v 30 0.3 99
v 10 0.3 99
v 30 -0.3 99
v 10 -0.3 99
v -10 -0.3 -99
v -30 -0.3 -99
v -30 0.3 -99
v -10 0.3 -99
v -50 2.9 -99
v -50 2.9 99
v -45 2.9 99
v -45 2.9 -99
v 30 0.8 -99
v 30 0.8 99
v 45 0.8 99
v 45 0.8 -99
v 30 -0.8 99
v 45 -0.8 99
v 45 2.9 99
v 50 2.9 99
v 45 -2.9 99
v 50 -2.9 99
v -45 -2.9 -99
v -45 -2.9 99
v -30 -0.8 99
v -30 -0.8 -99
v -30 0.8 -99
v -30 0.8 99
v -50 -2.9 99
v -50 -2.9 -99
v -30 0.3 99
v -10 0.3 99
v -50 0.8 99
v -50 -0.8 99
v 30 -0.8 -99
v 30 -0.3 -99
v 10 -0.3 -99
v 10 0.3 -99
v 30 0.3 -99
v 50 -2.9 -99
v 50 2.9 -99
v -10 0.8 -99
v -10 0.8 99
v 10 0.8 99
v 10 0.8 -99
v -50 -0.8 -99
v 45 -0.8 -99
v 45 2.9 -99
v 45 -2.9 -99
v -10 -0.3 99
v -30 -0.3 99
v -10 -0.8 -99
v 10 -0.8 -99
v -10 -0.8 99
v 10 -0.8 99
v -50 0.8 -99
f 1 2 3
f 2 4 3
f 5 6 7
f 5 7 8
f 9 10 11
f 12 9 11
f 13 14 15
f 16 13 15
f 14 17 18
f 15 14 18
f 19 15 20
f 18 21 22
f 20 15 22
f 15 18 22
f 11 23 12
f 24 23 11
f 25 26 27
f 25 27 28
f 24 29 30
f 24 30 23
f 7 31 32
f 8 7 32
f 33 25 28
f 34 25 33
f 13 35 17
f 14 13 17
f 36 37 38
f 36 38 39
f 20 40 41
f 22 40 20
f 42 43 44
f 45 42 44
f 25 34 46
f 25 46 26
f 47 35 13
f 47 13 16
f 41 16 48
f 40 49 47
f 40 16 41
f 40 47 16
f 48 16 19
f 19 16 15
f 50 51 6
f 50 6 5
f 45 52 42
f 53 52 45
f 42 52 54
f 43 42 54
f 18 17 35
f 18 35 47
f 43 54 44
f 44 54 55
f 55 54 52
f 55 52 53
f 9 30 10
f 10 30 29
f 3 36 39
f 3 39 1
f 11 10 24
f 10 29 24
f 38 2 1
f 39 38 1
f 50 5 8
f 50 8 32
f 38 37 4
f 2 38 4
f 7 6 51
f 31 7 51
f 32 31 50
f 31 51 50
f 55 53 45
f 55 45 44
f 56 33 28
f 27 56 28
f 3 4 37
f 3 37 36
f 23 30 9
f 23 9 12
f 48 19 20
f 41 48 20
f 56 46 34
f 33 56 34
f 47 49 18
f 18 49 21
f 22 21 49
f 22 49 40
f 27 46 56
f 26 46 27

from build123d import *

# Parameters (mm, degrees)
F0_W     = 5
F0_H     = 198
F1_DEPTH = 2.9
F0_W_2   = 15
F2_DEPTH = 0.8
F0_W_3   = 20
F3_DEPTH = 0.3


with BuildPart() as f1:
    # F0 (on Front) → F1 (new body, symmetric)
    with BuildSketch(Plane.XZ):
        with Locations((47.5, 0)):
            Rectangle(F0_W, F0_H)
    extrude(amount=F1_DEPTH, both=True)

    # F0 (on Front) → F2 (join, symmetric)
    with BuildSketch(Plane.XZ):
        with Locations((37.5, 0)):
            Rectangle(F0_W_2, F0_H)
    extrude(amount=F2_DEPTH, both=True)


with BuildPart() as f1b:
    # F0 (on Front) → F1, piece 2 (new body, symmetric)
    with BuildSketch(Plane.XZ):
        with Locations((-47.5, 0)):
            Rectangle(F0_W, F0_H)
    extrude(amount=F1_DEPTH, both=True)


with BuildPart() as f2:
    # F0 (on Front) → F2, piece 2 (new body, symmetric)
    with BuildSketch(Plane.XZ):
        Rectangle(F0_W_3, F0_H)
    extrude(amount=F2_DEPTH, both=True)


with BuildPart() as f2b:
    # F0 (on Front) → F2, piece 3 (new body, symmetric)
    with BuildSketch(Plane.XZ):
        with Locations((-47.5, 0)):
            Rectangle(F0_W, F0_H)
        with Locations((-37.5, 0)):
            Rectangle(F0_W_2, F0_H)
    extrude(amount=F2_DEPTH, both=True)


with BuildPart() as f3:
    # F0 (on Front) → F3 (new body, symmetric)
    with BuildSketch(Plane.XZ):
        with Locations((-20, 0)):
            Rectangle(F0_W_3, F0_H)
    extrude(amount=F3_DEPTH, both=True)


with BuildPart() as f3b:
    # F0 (on Front) → F3, piece 2 (new body, symmetric)
    with BuildSketch(Plane.XZ):
        with Locations((20, 0)):
            Rectangle(F0_W_3, F0_H)
    extrude(amount=F3_DEPTH, both=True)


solid = Compound([f1.part, f1b.part, f2.part, f2b.part, f3.part, f3b.part])
